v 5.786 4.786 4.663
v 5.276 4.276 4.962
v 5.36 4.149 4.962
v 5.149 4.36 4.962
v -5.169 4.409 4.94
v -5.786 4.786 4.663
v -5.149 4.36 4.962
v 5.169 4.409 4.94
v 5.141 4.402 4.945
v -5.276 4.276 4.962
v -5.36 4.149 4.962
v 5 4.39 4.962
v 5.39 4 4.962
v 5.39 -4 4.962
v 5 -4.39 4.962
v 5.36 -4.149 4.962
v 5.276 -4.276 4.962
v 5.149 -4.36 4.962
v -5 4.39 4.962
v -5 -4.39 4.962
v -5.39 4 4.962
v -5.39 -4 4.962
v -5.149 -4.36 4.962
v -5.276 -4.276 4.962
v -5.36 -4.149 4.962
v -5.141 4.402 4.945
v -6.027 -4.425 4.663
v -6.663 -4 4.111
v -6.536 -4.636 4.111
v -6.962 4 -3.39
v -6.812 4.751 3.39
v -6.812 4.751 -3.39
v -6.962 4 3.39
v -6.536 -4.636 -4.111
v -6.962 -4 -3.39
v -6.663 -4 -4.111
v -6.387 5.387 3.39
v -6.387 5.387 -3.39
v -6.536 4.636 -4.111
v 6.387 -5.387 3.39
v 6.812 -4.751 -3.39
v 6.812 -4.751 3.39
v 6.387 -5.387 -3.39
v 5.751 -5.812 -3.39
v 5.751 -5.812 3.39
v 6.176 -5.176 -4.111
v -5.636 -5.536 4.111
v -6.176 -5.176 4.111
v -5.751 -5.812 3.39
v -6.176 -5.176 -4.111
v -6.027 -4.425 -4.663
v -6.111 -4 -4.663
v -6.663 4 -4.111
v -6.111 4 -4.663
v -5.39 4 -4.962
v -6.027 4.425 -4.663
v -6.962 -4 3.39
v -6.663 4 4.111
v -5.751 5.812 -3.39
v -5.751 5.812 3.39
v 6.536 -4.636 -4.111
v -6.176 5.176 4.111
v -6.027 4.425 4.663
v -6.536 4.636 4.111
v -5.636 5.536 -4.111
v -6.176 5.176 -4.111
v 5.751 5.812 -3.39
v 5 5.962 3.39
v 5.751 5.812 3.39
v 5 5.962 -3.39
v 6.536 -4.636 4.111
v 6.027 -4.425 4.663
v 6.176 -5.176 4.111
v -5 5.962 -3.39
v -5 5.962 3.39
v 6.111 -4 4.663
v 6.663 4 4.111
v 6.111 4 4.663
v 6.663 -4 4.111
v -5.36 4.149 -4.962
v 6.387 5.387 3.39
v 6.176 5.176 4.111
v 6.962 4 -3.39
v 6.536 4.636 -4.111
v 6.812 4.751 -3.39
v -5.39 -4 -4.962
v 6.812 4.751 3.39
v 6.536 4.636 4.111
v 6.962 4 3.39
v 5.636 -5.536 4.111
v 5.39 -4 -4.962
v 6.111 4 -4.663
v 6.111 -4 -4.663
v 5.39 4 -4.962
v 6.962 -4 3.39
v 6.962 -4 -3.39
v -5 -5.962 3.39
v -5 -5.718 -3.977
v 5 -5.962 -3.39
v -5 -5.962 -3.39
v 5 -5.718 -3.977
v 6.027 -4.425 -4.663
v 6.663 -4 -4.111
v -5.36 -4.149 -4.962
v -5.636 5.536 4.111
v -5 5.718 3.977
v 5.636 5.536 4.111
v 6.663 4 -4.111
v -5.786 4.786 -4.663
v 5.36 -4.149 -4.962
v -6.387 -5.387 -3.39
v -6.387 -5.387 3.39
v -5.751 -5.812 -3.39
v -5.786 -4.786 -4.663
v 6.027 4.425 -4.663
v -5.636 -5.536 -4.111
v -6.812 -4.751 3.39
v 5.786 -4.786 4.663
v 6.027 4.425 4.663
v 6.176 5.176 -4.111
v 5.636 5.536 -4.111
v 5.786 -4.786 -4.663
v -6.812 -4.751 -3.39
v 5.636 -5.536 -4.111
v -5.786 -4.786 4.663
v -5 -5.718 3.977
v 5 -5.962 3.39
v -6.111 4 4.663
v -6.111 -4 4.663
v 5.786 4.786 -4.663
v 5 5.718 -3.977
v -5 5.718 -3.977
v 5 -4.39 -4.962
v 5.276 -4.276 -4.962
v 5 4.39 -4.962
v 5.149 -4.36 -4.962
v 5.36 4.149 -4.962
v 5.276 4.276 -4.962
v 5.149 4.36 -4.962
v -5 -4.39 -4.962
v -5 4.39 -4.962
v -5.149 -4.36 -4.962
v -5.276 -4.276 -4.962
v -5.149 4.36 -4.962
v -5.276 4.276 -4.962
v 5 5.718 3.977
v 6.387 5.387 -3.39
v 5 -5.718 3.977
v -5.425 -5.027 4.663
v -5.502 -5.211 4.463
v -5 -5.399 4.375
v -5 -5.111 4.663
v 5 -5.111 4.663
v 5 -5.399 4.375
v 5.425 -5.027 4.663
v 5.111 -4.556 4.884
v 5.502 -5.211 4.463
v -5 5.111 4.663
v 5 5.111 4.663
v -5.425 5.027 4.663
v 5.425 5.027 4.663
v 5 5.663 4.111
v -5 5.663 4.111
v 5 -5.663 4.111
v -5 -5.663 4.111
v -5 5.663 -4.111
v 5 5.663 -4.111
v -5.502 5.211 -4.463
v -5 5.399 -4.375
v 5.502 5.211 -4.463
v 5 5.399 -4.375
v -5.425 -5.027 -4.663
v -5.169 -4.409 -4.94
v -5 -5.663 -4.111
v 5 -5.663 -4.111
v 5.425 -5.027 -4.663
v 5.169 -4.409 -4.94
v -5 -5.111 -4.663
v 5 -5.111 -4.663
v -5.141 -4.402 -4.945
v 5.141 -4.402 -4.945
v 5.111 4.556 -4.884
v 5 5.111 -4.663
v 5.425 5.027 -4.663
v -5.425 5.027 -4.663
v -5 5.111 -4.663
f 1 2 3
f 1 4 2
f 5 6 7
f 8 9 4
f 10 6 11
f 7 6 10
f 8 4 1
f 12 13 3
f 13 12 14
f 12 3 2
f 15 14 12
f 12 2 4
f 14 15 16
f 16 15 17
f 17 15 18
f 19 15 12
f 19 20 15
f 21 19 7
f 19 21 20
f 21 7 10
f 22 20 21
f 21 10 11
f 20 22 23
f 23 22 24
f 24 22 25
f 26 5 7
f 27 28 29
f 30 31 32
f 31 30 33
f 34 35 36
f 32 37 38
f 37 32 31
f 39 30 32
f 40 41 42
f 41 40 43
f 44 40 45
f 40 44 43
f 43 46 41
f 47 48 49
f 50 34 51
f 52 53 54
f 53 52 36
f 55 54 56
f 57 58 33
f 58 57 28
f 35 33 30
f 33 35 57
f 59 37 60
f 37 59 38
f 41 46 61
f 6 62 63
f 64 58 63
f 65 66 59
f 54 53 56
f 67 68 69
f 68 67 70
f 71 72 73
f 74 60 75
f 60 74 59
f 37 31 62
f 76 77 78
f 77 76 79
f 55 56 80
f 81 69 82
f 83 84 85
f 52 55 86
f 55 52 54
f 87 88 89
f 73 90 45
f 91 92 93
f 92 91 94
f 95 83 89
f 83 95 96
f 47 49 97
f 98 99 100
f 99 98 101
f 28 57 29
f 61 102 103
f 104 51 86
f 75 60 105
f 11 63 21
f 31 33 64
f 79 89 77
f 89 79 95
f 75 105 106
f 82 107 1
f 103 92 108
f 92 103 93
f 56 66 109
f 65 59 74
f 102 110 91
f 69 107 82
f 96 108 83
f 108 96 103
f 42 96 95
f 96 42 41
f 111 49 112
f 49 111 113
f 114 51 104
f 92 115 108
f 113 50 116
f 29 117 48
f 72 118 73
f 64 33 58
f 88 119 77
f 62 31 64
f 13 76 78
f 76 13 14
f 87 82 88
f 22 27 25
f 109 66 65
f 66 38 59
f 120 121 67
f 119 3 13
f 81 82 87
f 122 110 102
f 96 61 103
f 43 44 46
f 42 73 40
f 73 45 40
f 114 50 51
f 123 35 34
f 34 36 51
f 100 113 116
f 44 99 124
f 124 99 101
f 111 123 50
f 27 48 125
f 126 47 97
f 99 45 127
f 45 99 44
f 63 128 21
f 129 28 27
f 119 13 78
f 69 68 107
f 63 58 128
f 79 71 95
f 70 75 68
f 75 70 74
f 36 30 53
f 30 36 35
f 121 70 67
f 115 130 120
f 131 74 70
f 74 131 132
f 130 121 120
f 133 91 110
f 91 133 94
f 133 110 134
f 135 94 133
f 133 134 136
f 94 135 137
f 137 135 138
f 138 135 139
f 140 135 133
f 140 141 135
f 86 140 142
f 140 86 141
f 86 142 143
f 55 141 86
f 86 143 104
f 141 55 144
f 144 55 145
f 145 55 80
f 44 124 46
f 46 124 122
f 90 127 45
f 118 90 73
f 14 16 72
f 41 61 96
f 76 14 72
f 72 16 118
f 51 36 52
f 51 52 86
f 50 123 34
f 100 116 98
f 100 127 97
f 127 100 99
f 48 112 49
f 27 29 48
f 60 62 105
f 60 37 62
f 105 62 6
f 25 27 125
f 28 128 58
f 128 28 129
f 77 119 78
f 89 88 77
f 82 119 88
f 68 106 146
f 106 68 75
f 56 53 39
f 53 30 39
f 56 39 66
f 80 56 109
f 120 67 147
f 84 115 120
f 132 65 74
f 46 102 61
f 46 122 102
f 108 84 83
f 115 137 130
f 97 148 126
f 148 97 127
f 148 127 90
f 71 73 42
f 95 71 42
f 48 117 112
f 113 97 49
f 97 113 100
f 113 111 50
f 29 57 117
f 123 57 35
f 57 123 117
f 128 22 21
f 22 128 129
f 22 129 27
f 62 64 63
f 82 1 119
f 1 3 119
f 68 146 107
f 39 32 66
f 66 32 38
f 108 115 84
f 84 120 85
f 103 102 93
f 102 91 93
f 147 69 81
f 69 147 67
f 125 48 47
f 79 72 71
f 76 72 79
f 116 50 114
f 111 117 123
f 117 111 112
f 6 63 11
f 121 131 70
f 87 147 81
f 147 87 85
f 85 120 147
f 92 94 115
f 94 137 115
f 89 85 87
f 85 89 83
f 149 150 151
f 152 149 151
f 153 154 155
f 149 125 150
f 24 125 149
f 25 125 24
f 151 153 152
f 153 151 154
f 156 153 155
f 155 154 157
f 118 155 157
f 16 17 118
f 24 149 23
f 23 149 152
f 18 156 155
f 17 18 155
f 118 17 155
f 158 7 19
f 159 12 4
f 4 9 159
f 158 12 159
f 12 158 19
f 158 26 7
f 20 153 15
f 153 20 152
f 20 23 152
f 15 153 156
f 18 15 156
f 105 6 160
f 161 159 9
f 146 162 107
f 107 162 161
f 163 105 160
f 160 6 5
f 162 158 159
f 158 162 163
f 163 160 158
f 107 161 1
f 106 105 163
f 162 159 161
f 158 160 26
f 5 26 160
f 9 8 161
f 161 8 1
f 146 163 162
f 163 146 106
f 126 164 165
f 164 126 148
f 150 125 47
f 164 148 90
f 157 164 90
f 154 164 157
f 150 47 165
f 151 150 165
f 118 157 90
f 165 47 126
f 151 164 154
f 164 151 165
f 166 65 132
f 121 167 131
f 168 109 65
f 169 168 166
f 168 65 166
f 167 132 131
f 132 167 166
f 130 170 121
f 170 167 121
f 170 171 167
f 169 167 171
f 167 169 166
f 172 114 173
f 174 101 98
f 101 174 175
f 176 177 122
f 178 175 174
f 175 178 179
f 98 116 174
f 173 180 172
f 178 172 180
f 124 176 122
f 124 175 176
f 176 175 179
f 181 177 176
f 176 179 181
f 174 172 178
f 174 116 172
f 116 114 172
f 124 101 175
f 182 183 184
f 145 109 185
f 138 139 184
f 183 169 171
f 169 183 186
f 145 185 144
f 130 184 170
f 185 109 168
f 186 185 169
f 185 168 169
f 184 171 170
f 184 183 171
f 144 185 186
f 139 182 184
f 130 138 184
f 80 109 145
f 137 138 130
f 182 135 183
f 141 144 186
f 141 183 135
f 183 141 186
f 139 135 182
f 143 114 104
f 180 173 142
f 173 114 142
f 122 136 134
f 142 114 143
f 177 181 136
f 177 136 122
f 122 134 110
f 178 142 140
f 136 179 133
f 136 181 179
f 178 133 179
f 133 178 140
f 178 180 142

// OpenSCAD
// Rung 1 extension: minkowski() with a polyhedron ball kernel, as
// BOSL2's cuboid(rounding=) actually emits -- a many-vertex faceted
// sphere baked as explicit polyhedron data, not a literal sphere()
// node. Verified against the real BOSL2 output during design: 258
// vertices, radius exact to ~1e-6. This fixture uses a smaller,
// self-contained 128-vertex sphere (openscad sphere(r=2, $fn=16),
// exported to STL and re-embedded as polyhedron data) so the test
// suite does not depend on BOSL2 being installed.
points = [
    [0.36048,0.149316,1.961571],
    [0.36048,-0.149316,1.961571],
    [0.390181,0.0,1.961571],
    [0.275899,0.275899,1.961571],
    [0.275899,-0.275899,1.961571],
    [0.149316,0.36048,1.961571],
    [0.149316,-0.36048,1.961571],
    [0.0,0.390181,1.961571],
    [0.0,-0.390181,1.961571],
    [-0.149316,0.36048,1.961571],
    [-0.149316,-0.36048,1.961571],
    [-0.275899,0.275899,1.961571],
    [-0.275899,-0.275899,1.961571],
    [-0.36048,0.149316,1.961571],
    [-0.36048,-0.149316,1.961571],
    [-0.390181,0.0,1.961571],
    [1.02656,0.425215,1.662939],
    [1.11114,0.0,1.662939],
    [0.785695,0.785695,1.662939],
    [0.425215,1.02656,1.662939],
    [0.0,1.11114,1.662939],
    [-0.425215,1.02656,1.662939],
    [-0.785695,0.785695,1.662939],
    [-1.02656,0.425215,1.662939],
    [-1.11114,0.0,1.662939],
    [-1.02656,-0.425215,1.662939],
    [-0.785695,-0.785695,1.662939],
    [-0.425215,-1.02656,1.662939],
    [0.0,-1.11114,1.662939],
    [0.425215,-1.02656,1.662939],
    [0.785695,-0.785695,1.662939],
    [1.02656,-0.425215,1.662939],
    [1.662939,0.0,1.11114],
    [1.536356,0.636379,1.11114],
    [1.175876,1.175876,1.11114],
    [0.636379,1.536356,1.11114],
    [0.0,1.662939,1.11114],
    [-0.636379,1.536356,1.11114],
    [-1.175876,1.175876,1.11114],
    [-1.536356,0.636379,1.11114],
    [-1.662939,0.0,1.11114],
    [-1.536356,-0.636379,1.11114],
    [-1.175876,-1.175876,1.11114],
    [-0.636379,-1.536356,1.11114],
    [0.0,-1.662939,1.11114],
    [0.636379,-1.536356,1.11114],
    [1.175876,-1.175876,1.11114],
    [1.536356,-0.636379,1.11114],
    [1.961571,0.0,0.390181],
    [1.812255,0.750661,0.390181],
    [1.38704,1.38704,0.390181],
    [0.750661,1.812255,0.390181],
    [0.0,1.961571,0.390181],
    [-0.750661,1.812255,0.390181],
    [-1.38704,1.38704,0.390181],
    [-1.812255,0.750661,0.390181],
    [-1.961571,0.0,0.390181],
    [-1.812255,-0.750661,0.390181],
    [-1.38704,-1.38704,0.390181],
    [-0.750661,-1.812255,0.390181],
    [0.0,-1.961571,0.390181],
    [0.750661,-1.812255,0.390181],
    [1.38704,-1.38704,0.390181],
    [1.812255,-0.750661,0.390181],
    [1.812255,0.750661,-0.390181],
    [1.961571,0.0,-0.390181],
    [1.38704,1.38704,-0.390181],
    [0.750661,1.812255,-0.390181],
    [0.0,1.961571,-0.390181],
    [-0.750661,1.812255,-0.390181],
    [-1.38704,1.38704,-0.390181],
    [-1.812255,0.750661,-0.390181],
    [-1.961571,0.0,-0.390181],
    [-1.812255,-0.750661,-0.390181],
    [-1.38704,-1.38704,-0.390181],
    [-0.750661,-1.812255,-0.390181],
    [0.0,-1.961571,-0.390181],
    [0.750661,-1.812255,-0.390181],
    [1.38704,-1.38704,-0.390181],
    [1.812255,-0.750661,-0.390181],
    [1.536356,0.636379,-1.11114],
    [1.662939,0.0,-1.11114],
    [1.175876,1.175876,-1.11114],
    [0.636379,1.536356,-1.11114],
    [0.0,1.662939,-1.11114],
    [-0.636379,1.536356,-1.11114],
    [-1.175876,1.175876,-1.11114],
    [-1.536356,0.636379,-1.11114],
    [-1.662939,0.0,-1.11114],
    [-1.536356,-0.636379,-1.11114],
    [-1.175876,-1.175876,-1.11114],
    [-0.636379,-1.536356,-1.11114],
    [0.0,-1.662939,-1.11114],
    [0.636379,-1.536356,-1.11114],
    [1.175876,-1.175876,-1.11114],
    [1.536356,-0.636379,-1.11114],
    [1.02656,0.425215,-1.662939],
    [1.11114,0.0,-1.662939],
    [0.785695,0.785695,-1.662939],
    [0.425215,1.02656,-1.662939],
    [0.0,1.11114,-1.662939],
    [-0.425215,1.02656,-1.662939],
    [-0.785695,0.785695,-1.662939],
    [-1.02656,0.425215,-1.662939],
    [-1.11114,0.0,-1.662939],
    [-1.02656,-0.425215,-1.662939],
    [-0.785695,-0.785695,-1.662939],
    [-0.425215,-1.02656,-1.662939],
    [0.0,-1.11114,-1.662939],
    [0.425215,-1.02656,-1.662939],
    [0.785695,-0.785695,-1.662939],
    [1.02656,-0.425215,-1.662939],
    [0.390181,0.0,-1.961571],
    [0.36048,0.149316,-1.961571],
    [0.275899,0.275899,-1.961571],
    [0.149316,0.36048,-1.961571],
    [0.0,0.390181,-1.961571],
    [-0.149316,0.36048,-1.961571],
    [-0.275899,0.275899,-1.961571],
    [-0.36048,0.149316,-1.961571],
    [-0.390181,0.0,-1.961571],
    [-0.36048,-0.149316,-1.961571],
    [-0.275899,-0.275899,-1.961571],
    [-0.149316,-0.36048,-1.961571],
    [0.0,-0.390181,-1.961571],
    [0.149316,-0.36048,-1.961571],
    [0.275899,-0.275899,-1.961571],
    [0.36048,-0.149316,-1.961571]
];
faces = [
    [0,1,2],
    [3,1,0],
    [3,4,1],
    [5,4,3],
    [5,6,4],
    [7,6,5],
    [7,8,6],
    [9,8,7],
    [9,10,8],
    [11,10,9],
    [11,12,10],
    [13,12,11],
    [13,14,12],
    [14,13,15],
    [16,2,17],
    [2,16,0],
    [18,0,16],
    [0,18,3],
    [19,3,18],
    [3,19,5],
    [20,5,19],
    [5,20,7],
    [20,9,7],
    [9,20,21],
    [21,11,9],
    [11,21,22],
    [22,13,11],
    [13,22,23],
    [23,15,13],
    [15,23,24],
    [15,25,14],
    [25,15,24],
    [14,26,12],
    [26,14,25],
    [12,27,10],
    [27,12,26],
    [10,28,8],
    [28,10,27],
    [8,29,6],
    [29,8,28],
    [4,29,30],
    [29,4,6],
    [1,30,31],
    [30,1,4],
    [2,31,17],
    [31,2,1],
    [32,16,17],
    [16,32,33],
    [34,16,33],
    [16,34,18],
    [35,18,34],
    [18,35,19],
    [36,19,35],
    [19,36,20],
    [36,21,20],
    [21,36,37],
    [37,22,21],
    [22,37,38],
    [38,23,22],
    [23,38,39],
    [40,23,39],
    [23,40,24],
    [40,25,24],
    [25,40,41],
    [25,42,26],
    [42,25,41],
    [26,43,27],
    [43,26,42],
    [44,27,43],
    [27,44,28],
    [44,29,28],
    [29,44,45],
    [30,45,46],
    [45,30,29],
    [31,46,47],
    [46,31,30],
    [31,32,17],
    [32,31,47],
    [48,33,32],
    [33,48,49],
    [34,49,50],
    [49,34,33],
    [51,34,50],
    [34,51,35],
    [52,35,51],
    [35,52,36],
    [52,37,36],
    [37,52,53],
    [53,38,37],
    [38,53,54],
    [55,38,54],
    [38,55,39],
    [56,39,55],
    [39,56,40],
    [56,41,40],
    [41,56,57],
    [57,42,41],
    [42,57,58],
    [59,42,58],
    [42,59,43],
    [60,43,59],
    [43,60,44],
    [60,45,44],
    [45,60,61],
    [61,46,45],
    [46,61,62],
    [46,63,47],
    [63,46,62],
    [47,48,32],
    [48,47,63],
    [48,64,49],
    [64,48,65],
    [49,66,50],
    [66,49,64],
    [66,51,50],
    [51,66,67],
    [67,52,51],
    [52,67,68],
    [68,53,52],
    [53,68,69],
    [69,54,53],
    [54,69,70],
    [71,54,70],
    [54,71,55],
    [72,55,71],
    [55,72,56],
    [73,56,72],
    [56,73,57],
    [74,57,73],
    [57,74,58],
    [74,59,58],
    [59,74,75],
    [75,60,59],
    [60,75,76],
    [76,61,60],
    [61,76,77],
    [77,62,61],
    [62,77,78],
    [62,79,63],
    [79,62,78],
    [63,65,48],
    [65,63,79],
    [65,80,64],
    [80,65,81],
    [64,82,66],
    [82,64,80],
    [82,67,66],
    [67,82,83],
    [83,68,67],
    [68,83,84],
    [85,68,84],
    [68,85,69],
    [86,69,85],
    [69,86,70],
    [86,71,70],
    [71,86,87],
    [72,87,88],
    [87,72,71],
    [89,72,88],
    [72,89,73],
    [90,73,89],
    [73,90,74],
    [90,75,74],
    [75,90,91],
    [91,76,75],
    [76,91,92],
    [93,76,92],
    [76,93,77],
    [94,77,93],
    [77,94,78],
    [79,94,95],
    [94,79,78],
    [65,95,81],
    [95,65,79],
    [81,96,80],
    [96,81,97],
    [96,82,80],
    [82,96,98],
    [98,83,82],
    [83,98,99],
    [99,84,83],
    [84,99,100],
    [101,84,100],
    [84,101,85],
    [102,85,101],
    [85,102,86],
    [103,86,102],
    [86,103,87],
    [88,103,104],
    [103,88,87],
    [105,88,104],
    [88,105,89],
    [90,105,106],
    [105,90,89],
    [91,106,107],
    [106,91,90],
    [107,92,91],
    [92,107,108],
    [109,92,108],
    [92,109,93],
    [93,110,94],
    [110,93,109],
    [94,111,95],
    [111,94,110],
    [81,111,97],
    [111,81,95],
    [112,96,97],
    [96,112,113],
    [113,98,96],
    [98,113,114],
    [114,99,98],
    [99,114,115],
    [116,99,115],
    [99,116,100],
    [117,100,116],
    [100,117,101],
    [118,101,117],
    [101,118,102],
    [119,102,118],
    [102,119,103],
    [120,103,119],
    [103,120,104],
    [105,120,121],
    [120,105,104],
    [106,121,122],
    [121,106,105],
    [107,122,123],
    [122,107,106],
    [108,123,124],
    [123,108,107],
    [108,125,109],
    [125,108,124],
    [109,126,110],
    [126,109,125],
    [110,127,111],
    [127,110,126],
    [111,112,97],
    [112,111,127],
    [127,113,112],
    [126,113,127],
    [126,114,113],
    [125,114,126],
    [125,115,114],
    [124,115,125],
    [124,116,115],
    [123,116,124],
    [123,117,116],
    [122,117,123],
    [122,118,117],
    [121,118,122],
    [121,119,118],
    [119,121,120]
];
minkowski() {
    cube([10, 8, 6], center = true);
    polyhedron(points = points, faces = faces);
}
